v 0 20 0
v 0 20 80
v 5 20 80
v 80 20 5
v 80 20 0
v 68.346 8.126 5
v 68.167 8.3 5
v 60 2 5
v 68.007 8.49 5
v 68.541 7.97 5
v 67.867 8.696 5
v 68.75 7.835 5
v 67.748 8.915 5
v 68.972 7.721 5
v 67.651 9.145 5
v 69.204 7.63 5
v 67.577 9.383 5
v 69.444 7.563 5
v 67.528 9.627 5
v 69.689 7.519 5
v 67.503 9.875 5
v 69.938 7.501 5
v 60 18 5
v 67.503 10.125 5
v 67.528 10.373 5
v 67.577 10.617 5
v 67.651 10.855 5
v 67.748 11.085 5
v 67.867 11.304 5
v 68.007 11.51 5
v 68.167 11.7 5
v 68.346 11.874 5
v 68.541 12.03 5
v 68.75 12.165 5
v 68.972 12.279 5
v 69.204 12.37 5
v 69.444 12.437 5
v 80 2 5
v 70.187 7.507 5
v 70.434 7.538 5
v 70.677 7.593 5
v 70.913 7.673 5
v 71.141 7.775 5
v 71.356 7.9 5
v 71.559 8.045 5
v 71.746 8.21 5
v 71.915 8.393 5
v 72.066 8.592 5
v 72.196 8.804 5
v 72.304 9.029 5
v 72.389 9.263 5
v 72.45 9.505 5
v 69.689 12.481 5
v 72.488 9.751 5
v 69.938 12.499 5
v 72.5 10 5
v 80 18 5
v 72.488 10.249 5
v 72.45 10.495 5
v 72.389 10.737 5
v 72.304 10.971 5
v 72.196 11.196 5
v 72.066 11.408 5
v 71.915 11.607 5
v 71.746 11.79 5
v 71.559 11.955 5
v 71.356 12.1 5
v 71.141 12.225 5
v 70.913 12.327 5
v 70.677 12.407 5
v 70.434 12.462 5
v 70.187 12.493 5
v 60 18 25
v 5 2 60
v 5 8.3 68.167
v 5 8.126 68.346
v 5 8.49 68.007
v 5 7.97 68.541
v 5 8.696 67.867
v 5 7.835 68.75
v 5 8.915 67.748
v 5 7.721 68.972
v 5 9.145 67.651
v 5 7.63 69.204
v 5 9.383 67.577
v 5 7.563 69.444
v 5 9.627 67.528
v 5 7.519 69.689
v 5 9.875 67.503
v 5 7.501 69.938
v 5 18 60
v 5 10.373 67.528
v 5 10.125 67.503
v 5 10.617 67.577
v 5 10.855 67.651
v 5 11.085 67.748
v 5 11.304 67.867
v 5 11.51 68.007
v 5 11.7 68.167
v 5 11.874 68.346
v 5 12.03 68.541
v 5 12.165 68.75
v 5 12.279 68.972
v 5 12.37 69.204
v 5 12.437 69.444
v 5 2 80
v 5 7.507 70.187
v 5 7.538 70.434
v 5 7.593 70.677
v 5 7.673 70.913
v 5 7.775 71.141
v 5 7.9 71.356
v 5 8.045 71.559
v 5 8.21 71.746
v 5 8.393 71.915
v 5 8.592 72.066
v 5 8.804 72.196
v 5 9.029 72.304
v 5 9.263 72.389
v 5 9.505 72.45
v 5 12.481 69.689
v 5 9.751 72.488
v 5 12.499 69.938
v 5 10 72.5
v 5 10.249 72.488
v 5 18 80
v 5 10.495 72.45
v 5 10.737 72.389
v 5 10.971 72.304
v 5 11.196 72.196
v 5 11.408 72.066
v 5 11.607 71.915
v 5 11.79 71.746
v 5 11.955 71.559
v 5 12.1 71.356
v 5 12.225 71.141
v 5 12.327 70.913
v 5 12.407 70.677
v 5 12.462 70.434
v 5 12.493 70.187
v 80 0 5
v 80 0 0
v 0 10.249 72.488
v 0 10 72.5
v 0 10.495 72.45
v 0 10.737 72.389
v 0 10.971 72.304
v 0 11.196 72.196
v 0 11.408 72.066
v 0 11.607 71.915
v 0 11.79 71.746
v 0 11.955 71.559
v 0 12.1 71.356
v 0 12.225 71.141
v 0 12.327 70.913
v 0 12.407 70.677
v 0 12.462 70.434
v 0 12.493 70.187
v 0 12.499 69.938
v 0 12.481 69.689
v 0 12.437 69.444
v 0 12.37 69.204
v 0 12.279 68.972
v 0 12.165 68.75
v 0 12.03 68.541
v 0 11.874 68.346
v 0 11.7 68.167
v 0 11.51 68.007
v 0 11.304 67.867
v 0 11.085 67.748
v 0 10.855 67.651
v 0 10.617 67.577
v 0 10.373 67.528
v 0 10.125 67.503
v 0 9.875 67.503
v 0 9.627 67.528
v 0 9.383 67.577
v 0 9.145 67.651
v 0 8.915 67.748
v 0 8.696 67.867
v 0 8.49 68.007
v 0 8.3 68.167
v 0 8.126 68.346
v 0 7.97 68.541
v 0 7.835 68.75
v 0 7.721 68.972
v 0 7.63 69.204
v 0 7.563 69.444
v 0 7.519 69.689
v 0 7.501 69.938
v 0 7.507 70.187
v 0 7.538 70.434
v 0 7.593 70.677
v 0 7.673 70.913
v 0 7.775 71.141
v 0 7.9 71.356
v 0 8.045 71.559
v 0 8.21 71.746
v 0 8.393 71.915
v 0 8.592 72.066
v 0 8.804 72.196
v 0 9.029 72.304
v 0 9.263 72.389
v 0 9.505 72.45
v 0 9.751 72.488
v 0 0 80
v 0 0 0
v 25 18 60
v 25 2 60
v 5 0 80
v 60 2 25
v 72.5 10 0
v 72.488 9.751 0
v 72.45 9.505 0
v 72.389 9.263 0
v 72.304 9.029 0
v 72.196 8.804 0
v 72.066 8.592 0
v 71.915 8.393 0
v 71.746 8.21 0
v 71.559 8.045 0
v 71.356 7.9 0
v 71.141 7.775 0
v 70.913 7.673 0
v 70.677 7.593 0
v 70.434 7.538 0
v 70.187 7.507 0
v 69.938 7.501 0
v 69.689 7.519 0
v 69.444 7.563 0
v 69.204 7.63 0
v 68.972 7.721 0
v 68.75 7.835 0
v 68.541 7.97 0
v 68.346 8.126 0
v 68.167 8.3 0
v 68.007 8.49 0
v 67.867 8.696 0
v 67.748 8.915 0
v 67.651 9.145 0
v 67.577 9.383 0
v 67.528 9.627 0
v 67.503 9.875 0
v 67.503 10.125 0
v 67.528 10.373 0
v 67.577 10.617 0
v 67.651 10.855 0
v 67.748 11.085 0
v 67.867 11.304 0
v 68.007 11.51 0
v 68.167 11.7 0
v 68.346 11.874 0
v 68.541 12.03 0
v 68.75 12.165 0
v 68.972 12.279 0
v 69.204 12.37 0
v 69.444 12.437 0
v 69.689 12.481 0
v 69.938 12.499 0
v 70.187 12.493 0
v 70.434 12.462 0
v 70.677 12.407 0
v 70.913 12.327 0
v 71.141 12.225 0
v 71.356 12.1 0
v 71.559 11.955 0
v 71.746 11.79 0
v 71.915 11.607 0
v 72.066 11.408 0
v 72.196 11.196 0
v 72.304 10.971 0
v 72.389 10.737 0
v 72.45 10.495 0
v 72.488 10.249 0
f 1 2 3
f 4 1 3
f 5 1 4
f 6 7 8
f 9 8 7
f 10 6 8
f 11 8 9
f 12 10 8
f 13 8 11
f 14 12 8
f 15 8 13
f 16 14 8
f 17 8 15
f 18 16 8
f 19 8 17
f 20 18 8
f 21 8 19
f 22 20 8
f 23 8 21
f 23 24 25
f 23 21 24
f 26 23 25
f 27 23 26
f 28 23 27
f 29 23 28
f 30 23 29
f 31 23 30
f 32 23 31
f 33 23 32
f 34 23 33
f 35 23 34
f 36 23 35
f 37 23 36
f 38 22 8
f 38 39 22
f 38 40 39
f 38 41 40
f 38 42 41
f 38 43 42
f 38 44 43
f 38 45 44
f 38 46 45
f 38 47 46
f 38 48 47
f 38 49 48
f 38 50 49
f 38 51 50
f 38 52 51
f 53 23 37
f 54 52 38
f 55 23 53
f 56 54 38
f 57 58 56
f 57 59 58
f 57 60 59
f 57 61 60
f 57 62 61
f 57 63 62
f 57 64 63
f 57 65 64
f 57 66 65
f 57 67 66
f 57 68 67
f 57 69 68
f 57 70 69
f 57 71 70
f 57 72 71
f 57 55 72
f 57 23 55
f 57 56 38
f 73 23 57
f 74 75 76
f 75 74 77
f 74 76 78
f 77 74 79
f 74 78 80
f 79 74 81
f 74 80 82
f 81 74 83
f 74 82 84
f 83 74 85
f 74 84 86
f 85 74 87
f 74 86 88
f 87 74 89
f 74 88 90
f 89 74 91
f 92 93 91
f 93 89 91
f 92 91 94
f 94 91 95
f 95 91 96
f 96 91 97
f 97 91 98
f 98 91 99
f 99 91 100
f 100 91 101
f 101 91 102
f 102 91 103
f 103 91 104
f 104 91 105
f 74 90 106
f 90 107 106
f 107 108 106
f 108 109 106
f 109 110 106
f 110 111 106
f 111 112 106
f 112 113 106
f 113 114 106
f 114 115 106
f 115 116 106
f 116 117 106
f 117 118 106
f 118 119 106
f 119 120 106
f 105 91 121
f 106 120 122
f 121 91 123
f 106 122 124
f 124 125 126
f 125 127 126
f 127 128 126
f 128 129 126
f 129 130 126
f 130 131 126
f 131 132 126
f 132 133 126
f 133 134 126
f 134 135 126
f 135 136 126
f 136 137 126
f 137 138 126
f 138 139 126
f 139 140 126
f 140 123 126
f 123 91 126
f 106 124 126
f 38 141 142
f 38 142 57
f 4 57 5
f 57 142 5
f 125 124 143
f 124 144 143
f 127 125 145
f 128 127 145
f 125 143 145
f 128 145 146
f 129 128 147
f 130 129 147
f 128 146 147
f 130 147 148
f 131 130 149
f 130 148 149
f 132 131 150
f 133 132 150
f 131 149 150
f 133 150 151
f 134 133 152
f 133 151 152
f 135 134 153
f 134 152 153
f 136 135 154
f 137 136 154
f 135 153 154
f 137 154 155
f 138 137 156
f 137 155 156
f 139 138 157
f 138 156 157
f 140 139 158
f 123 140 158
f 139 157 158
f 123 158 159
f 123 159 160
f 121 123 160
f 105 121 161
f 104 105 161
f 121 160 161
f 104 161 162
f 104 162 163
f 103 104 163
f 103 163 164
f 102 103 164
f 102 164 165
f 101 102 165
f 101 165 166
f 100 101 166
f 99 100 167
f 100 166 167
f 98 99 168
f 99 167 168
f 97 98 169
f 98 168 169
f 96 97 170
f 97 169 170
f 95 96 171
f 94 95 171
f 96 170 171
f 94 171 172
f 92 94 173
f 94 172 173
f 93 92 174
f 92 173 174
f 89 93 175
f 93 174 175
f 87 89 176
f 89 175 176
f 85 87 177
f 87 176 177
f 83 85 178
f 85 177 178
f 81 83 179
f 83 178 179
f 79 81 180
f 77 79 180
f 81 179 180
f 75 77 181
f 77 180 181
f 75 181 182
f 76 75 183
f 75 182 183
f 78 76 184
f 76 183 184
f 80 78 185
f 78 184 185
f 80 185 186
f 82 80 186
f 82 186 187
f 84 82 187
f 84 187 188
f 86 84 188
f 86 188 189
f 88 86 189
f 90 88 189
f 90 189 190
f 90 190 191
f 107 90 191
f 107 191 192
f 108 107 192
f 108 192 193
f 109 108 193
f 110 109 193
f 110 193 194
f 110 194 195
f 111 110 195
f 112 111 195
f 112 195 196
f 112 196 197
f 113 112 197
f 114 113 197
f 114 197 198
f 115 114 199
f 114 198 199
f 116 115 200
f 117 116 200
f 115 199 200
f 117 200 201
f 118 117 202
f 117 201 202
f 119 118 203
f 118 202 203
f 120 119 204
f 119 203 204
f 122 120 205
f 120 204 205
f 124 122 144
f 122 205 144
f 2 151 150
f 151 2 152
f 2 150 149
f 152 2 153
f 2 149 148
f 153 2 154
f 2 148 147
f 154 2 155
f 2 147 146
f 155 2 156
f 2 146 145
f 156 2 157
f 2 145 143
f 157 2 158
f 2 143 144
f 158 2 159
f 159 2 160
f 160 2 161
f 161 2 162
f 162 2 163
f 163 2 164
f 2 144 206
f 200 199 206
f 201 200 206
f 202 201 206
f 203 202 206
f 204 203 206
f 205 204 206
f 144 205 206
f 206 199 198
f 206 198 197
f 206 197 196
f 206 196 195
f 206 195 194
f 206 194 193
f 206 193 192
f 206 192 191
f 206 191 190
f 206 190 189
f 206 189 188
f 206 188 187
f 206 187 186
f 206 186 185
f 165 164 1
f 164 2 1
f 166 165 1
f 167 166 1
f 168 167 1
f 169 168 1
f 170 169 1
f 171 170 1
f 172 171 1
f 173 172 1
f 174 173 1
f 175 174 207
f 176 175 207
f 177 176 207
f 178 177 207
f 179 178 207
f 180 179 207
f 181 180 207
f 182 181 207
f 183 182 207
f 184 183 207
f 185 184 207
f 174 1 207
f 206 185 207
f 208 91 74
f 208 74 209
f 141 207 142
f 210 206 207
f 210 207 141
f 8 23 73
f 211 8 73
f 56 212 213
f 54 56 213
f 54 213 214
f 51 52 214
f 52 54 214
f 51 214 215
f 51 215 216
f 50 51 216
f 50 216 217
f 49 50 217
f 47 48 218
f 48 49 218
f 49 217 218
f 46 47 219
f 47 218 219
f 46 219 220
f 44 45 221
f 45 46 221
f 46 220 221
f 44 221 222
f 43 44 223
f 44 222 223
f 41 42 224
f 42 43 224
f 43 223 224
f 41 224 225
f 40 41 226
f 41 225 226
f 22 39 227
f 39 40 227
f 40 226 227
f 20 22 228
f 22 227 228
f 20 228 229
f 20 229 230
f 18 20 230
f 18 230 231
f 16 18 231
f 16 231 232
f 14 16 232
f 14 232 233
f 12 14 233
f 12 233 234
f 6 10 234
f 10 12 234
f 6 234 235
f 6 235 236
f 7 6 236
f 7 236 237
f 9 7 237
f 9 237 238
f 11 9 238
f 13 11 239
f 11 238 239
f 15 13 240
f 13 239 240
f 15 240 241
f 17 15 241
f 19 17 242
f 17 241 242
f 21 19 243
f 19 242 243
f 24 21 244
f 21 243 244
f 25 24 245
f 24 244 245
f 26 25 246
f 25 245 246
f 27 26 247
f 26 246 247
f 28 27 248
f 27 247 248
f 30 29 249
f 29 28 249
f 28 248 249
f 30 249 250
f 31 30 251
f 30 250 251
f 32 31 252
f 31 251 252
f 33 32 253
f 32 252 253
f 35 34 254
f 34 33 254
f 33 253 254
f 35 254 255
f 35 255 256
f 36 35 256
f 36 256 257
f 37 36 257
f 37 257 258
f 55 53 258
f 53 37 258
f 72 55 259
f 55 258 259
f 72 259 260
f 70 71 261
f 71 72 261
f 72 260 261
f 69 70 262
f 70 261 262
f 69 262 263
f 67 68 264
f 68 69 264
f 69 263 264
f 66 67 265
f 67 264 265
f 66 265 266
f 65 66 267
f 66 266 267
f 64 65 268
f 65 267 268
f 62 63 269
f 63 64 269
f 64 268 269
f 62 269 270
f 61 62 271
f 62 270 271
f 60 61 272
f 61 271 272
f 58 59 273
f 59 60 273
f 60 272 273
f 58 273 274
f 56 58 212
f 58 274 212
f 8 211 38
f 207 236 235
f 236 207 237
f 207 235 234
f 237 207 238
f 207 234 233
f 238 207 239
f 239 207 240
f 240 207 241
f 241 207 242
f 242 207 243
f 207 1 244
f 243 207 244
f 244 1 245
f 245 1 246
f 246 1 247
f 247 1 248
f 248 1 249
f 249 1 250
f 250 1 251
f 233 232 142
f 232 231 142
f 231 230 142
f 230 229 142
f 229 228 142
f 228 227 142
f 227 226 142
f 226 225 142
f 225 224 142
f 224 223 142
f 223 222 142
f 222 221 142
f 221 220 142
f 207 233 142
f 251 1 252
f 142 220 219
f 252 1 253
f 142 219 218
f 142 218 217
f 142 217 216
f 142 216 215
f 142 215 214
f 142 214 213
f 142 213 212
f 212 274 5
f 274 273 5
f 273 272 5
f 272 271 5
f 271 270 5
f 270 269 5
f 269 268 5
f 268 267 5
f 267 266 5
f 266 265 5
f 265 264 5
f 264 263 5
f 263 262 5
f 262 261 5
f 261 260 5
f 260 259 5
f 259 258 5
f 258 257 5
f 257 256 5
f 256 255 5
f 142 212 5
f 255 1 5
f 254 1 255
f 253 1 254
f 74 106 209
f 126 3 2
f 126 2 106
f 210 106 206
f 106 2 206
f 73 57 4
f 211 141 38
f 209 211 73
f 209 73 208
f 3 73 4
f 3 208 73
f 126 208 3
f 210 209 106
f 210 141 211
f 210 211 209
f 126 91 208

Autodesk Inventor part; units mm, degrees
ref_plane "YZ Plane" through (0, 0, 0) normal (1, 0, 0) x (0, 1, 0)
ref_plane "XZ Plane" through (0, 0, 0) normal (0, 1, 0) x (-1, 0, 0)
ref_plane "XY Plane" through (0, 0, 0) normal (0, 0, 1) x (1, 0, 0)
sketch "Sketch1" plane through (0, 0, 0) normal (0, 0, 1) x (1, 0, 0)
  line L0 (0, 0) -> (80, 0)
  line L1 (80, 0) -> (80, 20)
  line L2 (80, 20) -> (0, 20)
  line L3 (0, 20) -> (0, 0)
  circle A0 centre (70, 10) radius 2.5
  point P0 (80, 10)
  dimension "d0" = 80
  dimension "d1" = 20
  dimension "d2" = 5
  dimension "d3" = 10
extrude "Extrusion1" add sketch "Sketch1" along normal blind 5
sketch "Sketch2" plane through (0, 0, 0) normal (-1, 0, 0) x (0, 0, 1)
  line L0 (0, 0) -> (0, 20) projected
  line L1 (0, 20) -> (80, 20)
  line L2 (80, 20) -> (80, 0)
  line L3 (80, 0) -> (0, 0)
  line L4 (0, 0) -> (0, 20)
  circle A0 centre (70, 10) radius 2.5
  point P0 (5, 0)
  point P1 (80, 10)
  dimension "d6" = 80
  dimension "d7" = 5
  dimension "d8" = 10
extrude "Extrusion2" add sketch "Sketch2" against normal blind 5
sketch "Sketch3" plane through (0, 20, 0) normal (0, 1, 0) x (1, 0, 0)
  line L0 (80, -5) -> (5, -5) projected
  line L1 (5, -5) -> (5, -80) projected
  line L2 (5, -80) -> (5, -5) projected
  line L3 (5, -80) -> (80, -5)
  point P0 (0, 0)
extrude "Extrusion3" add sketch "Sketch3" against normal blind 2
sketch "Sketch4" plane through (0, 0, 0) normal (0, -1, 0) x (1, 0, 0)
  line L0 (80, 5) -> (5, 5) projected
  line L1 (80, 5) -> (5, 80) projected
  line L2 (5, 5) -> (5, 80) projected
  point P0 (0, 0)
extrude "Extrusion4" add sketch "Sketch4" against normal blind 2
sketch "Sketch5" plane through (0, 18, 0) normal (0, -1, 0) x (1, 0, 0)
  line L0 (5, 72.5) -> (5, 67.5) projected
  line L1 (67.5, 5) -> (72.5, 5) projected
  line L2 (5, 67.5) -> (5, 5)
  line L3 (5, 5) -> (67.5, 5)
  line L4 (5, 60) -> (60, 5)
  line L5 (70, 5) -> (70, 0)
  line L6 (80, 0) -> (0, 0) projected
  line L7 (5, 70) -> (0, 70)
  line L8 (5, 60) -> (25, 60)
  line L9 (60, 5) -> (60, 25)
  line L10 (5, 80) -> (80, 5) projected
  line L11 (25, 60) -> (60, 25)
  dimension "d15" = 10
  dimension "d16" = 10
extrude "Extrusion5" add sketch "Sketch5" along normal blind 16
properties part number "L Bracket Small"
